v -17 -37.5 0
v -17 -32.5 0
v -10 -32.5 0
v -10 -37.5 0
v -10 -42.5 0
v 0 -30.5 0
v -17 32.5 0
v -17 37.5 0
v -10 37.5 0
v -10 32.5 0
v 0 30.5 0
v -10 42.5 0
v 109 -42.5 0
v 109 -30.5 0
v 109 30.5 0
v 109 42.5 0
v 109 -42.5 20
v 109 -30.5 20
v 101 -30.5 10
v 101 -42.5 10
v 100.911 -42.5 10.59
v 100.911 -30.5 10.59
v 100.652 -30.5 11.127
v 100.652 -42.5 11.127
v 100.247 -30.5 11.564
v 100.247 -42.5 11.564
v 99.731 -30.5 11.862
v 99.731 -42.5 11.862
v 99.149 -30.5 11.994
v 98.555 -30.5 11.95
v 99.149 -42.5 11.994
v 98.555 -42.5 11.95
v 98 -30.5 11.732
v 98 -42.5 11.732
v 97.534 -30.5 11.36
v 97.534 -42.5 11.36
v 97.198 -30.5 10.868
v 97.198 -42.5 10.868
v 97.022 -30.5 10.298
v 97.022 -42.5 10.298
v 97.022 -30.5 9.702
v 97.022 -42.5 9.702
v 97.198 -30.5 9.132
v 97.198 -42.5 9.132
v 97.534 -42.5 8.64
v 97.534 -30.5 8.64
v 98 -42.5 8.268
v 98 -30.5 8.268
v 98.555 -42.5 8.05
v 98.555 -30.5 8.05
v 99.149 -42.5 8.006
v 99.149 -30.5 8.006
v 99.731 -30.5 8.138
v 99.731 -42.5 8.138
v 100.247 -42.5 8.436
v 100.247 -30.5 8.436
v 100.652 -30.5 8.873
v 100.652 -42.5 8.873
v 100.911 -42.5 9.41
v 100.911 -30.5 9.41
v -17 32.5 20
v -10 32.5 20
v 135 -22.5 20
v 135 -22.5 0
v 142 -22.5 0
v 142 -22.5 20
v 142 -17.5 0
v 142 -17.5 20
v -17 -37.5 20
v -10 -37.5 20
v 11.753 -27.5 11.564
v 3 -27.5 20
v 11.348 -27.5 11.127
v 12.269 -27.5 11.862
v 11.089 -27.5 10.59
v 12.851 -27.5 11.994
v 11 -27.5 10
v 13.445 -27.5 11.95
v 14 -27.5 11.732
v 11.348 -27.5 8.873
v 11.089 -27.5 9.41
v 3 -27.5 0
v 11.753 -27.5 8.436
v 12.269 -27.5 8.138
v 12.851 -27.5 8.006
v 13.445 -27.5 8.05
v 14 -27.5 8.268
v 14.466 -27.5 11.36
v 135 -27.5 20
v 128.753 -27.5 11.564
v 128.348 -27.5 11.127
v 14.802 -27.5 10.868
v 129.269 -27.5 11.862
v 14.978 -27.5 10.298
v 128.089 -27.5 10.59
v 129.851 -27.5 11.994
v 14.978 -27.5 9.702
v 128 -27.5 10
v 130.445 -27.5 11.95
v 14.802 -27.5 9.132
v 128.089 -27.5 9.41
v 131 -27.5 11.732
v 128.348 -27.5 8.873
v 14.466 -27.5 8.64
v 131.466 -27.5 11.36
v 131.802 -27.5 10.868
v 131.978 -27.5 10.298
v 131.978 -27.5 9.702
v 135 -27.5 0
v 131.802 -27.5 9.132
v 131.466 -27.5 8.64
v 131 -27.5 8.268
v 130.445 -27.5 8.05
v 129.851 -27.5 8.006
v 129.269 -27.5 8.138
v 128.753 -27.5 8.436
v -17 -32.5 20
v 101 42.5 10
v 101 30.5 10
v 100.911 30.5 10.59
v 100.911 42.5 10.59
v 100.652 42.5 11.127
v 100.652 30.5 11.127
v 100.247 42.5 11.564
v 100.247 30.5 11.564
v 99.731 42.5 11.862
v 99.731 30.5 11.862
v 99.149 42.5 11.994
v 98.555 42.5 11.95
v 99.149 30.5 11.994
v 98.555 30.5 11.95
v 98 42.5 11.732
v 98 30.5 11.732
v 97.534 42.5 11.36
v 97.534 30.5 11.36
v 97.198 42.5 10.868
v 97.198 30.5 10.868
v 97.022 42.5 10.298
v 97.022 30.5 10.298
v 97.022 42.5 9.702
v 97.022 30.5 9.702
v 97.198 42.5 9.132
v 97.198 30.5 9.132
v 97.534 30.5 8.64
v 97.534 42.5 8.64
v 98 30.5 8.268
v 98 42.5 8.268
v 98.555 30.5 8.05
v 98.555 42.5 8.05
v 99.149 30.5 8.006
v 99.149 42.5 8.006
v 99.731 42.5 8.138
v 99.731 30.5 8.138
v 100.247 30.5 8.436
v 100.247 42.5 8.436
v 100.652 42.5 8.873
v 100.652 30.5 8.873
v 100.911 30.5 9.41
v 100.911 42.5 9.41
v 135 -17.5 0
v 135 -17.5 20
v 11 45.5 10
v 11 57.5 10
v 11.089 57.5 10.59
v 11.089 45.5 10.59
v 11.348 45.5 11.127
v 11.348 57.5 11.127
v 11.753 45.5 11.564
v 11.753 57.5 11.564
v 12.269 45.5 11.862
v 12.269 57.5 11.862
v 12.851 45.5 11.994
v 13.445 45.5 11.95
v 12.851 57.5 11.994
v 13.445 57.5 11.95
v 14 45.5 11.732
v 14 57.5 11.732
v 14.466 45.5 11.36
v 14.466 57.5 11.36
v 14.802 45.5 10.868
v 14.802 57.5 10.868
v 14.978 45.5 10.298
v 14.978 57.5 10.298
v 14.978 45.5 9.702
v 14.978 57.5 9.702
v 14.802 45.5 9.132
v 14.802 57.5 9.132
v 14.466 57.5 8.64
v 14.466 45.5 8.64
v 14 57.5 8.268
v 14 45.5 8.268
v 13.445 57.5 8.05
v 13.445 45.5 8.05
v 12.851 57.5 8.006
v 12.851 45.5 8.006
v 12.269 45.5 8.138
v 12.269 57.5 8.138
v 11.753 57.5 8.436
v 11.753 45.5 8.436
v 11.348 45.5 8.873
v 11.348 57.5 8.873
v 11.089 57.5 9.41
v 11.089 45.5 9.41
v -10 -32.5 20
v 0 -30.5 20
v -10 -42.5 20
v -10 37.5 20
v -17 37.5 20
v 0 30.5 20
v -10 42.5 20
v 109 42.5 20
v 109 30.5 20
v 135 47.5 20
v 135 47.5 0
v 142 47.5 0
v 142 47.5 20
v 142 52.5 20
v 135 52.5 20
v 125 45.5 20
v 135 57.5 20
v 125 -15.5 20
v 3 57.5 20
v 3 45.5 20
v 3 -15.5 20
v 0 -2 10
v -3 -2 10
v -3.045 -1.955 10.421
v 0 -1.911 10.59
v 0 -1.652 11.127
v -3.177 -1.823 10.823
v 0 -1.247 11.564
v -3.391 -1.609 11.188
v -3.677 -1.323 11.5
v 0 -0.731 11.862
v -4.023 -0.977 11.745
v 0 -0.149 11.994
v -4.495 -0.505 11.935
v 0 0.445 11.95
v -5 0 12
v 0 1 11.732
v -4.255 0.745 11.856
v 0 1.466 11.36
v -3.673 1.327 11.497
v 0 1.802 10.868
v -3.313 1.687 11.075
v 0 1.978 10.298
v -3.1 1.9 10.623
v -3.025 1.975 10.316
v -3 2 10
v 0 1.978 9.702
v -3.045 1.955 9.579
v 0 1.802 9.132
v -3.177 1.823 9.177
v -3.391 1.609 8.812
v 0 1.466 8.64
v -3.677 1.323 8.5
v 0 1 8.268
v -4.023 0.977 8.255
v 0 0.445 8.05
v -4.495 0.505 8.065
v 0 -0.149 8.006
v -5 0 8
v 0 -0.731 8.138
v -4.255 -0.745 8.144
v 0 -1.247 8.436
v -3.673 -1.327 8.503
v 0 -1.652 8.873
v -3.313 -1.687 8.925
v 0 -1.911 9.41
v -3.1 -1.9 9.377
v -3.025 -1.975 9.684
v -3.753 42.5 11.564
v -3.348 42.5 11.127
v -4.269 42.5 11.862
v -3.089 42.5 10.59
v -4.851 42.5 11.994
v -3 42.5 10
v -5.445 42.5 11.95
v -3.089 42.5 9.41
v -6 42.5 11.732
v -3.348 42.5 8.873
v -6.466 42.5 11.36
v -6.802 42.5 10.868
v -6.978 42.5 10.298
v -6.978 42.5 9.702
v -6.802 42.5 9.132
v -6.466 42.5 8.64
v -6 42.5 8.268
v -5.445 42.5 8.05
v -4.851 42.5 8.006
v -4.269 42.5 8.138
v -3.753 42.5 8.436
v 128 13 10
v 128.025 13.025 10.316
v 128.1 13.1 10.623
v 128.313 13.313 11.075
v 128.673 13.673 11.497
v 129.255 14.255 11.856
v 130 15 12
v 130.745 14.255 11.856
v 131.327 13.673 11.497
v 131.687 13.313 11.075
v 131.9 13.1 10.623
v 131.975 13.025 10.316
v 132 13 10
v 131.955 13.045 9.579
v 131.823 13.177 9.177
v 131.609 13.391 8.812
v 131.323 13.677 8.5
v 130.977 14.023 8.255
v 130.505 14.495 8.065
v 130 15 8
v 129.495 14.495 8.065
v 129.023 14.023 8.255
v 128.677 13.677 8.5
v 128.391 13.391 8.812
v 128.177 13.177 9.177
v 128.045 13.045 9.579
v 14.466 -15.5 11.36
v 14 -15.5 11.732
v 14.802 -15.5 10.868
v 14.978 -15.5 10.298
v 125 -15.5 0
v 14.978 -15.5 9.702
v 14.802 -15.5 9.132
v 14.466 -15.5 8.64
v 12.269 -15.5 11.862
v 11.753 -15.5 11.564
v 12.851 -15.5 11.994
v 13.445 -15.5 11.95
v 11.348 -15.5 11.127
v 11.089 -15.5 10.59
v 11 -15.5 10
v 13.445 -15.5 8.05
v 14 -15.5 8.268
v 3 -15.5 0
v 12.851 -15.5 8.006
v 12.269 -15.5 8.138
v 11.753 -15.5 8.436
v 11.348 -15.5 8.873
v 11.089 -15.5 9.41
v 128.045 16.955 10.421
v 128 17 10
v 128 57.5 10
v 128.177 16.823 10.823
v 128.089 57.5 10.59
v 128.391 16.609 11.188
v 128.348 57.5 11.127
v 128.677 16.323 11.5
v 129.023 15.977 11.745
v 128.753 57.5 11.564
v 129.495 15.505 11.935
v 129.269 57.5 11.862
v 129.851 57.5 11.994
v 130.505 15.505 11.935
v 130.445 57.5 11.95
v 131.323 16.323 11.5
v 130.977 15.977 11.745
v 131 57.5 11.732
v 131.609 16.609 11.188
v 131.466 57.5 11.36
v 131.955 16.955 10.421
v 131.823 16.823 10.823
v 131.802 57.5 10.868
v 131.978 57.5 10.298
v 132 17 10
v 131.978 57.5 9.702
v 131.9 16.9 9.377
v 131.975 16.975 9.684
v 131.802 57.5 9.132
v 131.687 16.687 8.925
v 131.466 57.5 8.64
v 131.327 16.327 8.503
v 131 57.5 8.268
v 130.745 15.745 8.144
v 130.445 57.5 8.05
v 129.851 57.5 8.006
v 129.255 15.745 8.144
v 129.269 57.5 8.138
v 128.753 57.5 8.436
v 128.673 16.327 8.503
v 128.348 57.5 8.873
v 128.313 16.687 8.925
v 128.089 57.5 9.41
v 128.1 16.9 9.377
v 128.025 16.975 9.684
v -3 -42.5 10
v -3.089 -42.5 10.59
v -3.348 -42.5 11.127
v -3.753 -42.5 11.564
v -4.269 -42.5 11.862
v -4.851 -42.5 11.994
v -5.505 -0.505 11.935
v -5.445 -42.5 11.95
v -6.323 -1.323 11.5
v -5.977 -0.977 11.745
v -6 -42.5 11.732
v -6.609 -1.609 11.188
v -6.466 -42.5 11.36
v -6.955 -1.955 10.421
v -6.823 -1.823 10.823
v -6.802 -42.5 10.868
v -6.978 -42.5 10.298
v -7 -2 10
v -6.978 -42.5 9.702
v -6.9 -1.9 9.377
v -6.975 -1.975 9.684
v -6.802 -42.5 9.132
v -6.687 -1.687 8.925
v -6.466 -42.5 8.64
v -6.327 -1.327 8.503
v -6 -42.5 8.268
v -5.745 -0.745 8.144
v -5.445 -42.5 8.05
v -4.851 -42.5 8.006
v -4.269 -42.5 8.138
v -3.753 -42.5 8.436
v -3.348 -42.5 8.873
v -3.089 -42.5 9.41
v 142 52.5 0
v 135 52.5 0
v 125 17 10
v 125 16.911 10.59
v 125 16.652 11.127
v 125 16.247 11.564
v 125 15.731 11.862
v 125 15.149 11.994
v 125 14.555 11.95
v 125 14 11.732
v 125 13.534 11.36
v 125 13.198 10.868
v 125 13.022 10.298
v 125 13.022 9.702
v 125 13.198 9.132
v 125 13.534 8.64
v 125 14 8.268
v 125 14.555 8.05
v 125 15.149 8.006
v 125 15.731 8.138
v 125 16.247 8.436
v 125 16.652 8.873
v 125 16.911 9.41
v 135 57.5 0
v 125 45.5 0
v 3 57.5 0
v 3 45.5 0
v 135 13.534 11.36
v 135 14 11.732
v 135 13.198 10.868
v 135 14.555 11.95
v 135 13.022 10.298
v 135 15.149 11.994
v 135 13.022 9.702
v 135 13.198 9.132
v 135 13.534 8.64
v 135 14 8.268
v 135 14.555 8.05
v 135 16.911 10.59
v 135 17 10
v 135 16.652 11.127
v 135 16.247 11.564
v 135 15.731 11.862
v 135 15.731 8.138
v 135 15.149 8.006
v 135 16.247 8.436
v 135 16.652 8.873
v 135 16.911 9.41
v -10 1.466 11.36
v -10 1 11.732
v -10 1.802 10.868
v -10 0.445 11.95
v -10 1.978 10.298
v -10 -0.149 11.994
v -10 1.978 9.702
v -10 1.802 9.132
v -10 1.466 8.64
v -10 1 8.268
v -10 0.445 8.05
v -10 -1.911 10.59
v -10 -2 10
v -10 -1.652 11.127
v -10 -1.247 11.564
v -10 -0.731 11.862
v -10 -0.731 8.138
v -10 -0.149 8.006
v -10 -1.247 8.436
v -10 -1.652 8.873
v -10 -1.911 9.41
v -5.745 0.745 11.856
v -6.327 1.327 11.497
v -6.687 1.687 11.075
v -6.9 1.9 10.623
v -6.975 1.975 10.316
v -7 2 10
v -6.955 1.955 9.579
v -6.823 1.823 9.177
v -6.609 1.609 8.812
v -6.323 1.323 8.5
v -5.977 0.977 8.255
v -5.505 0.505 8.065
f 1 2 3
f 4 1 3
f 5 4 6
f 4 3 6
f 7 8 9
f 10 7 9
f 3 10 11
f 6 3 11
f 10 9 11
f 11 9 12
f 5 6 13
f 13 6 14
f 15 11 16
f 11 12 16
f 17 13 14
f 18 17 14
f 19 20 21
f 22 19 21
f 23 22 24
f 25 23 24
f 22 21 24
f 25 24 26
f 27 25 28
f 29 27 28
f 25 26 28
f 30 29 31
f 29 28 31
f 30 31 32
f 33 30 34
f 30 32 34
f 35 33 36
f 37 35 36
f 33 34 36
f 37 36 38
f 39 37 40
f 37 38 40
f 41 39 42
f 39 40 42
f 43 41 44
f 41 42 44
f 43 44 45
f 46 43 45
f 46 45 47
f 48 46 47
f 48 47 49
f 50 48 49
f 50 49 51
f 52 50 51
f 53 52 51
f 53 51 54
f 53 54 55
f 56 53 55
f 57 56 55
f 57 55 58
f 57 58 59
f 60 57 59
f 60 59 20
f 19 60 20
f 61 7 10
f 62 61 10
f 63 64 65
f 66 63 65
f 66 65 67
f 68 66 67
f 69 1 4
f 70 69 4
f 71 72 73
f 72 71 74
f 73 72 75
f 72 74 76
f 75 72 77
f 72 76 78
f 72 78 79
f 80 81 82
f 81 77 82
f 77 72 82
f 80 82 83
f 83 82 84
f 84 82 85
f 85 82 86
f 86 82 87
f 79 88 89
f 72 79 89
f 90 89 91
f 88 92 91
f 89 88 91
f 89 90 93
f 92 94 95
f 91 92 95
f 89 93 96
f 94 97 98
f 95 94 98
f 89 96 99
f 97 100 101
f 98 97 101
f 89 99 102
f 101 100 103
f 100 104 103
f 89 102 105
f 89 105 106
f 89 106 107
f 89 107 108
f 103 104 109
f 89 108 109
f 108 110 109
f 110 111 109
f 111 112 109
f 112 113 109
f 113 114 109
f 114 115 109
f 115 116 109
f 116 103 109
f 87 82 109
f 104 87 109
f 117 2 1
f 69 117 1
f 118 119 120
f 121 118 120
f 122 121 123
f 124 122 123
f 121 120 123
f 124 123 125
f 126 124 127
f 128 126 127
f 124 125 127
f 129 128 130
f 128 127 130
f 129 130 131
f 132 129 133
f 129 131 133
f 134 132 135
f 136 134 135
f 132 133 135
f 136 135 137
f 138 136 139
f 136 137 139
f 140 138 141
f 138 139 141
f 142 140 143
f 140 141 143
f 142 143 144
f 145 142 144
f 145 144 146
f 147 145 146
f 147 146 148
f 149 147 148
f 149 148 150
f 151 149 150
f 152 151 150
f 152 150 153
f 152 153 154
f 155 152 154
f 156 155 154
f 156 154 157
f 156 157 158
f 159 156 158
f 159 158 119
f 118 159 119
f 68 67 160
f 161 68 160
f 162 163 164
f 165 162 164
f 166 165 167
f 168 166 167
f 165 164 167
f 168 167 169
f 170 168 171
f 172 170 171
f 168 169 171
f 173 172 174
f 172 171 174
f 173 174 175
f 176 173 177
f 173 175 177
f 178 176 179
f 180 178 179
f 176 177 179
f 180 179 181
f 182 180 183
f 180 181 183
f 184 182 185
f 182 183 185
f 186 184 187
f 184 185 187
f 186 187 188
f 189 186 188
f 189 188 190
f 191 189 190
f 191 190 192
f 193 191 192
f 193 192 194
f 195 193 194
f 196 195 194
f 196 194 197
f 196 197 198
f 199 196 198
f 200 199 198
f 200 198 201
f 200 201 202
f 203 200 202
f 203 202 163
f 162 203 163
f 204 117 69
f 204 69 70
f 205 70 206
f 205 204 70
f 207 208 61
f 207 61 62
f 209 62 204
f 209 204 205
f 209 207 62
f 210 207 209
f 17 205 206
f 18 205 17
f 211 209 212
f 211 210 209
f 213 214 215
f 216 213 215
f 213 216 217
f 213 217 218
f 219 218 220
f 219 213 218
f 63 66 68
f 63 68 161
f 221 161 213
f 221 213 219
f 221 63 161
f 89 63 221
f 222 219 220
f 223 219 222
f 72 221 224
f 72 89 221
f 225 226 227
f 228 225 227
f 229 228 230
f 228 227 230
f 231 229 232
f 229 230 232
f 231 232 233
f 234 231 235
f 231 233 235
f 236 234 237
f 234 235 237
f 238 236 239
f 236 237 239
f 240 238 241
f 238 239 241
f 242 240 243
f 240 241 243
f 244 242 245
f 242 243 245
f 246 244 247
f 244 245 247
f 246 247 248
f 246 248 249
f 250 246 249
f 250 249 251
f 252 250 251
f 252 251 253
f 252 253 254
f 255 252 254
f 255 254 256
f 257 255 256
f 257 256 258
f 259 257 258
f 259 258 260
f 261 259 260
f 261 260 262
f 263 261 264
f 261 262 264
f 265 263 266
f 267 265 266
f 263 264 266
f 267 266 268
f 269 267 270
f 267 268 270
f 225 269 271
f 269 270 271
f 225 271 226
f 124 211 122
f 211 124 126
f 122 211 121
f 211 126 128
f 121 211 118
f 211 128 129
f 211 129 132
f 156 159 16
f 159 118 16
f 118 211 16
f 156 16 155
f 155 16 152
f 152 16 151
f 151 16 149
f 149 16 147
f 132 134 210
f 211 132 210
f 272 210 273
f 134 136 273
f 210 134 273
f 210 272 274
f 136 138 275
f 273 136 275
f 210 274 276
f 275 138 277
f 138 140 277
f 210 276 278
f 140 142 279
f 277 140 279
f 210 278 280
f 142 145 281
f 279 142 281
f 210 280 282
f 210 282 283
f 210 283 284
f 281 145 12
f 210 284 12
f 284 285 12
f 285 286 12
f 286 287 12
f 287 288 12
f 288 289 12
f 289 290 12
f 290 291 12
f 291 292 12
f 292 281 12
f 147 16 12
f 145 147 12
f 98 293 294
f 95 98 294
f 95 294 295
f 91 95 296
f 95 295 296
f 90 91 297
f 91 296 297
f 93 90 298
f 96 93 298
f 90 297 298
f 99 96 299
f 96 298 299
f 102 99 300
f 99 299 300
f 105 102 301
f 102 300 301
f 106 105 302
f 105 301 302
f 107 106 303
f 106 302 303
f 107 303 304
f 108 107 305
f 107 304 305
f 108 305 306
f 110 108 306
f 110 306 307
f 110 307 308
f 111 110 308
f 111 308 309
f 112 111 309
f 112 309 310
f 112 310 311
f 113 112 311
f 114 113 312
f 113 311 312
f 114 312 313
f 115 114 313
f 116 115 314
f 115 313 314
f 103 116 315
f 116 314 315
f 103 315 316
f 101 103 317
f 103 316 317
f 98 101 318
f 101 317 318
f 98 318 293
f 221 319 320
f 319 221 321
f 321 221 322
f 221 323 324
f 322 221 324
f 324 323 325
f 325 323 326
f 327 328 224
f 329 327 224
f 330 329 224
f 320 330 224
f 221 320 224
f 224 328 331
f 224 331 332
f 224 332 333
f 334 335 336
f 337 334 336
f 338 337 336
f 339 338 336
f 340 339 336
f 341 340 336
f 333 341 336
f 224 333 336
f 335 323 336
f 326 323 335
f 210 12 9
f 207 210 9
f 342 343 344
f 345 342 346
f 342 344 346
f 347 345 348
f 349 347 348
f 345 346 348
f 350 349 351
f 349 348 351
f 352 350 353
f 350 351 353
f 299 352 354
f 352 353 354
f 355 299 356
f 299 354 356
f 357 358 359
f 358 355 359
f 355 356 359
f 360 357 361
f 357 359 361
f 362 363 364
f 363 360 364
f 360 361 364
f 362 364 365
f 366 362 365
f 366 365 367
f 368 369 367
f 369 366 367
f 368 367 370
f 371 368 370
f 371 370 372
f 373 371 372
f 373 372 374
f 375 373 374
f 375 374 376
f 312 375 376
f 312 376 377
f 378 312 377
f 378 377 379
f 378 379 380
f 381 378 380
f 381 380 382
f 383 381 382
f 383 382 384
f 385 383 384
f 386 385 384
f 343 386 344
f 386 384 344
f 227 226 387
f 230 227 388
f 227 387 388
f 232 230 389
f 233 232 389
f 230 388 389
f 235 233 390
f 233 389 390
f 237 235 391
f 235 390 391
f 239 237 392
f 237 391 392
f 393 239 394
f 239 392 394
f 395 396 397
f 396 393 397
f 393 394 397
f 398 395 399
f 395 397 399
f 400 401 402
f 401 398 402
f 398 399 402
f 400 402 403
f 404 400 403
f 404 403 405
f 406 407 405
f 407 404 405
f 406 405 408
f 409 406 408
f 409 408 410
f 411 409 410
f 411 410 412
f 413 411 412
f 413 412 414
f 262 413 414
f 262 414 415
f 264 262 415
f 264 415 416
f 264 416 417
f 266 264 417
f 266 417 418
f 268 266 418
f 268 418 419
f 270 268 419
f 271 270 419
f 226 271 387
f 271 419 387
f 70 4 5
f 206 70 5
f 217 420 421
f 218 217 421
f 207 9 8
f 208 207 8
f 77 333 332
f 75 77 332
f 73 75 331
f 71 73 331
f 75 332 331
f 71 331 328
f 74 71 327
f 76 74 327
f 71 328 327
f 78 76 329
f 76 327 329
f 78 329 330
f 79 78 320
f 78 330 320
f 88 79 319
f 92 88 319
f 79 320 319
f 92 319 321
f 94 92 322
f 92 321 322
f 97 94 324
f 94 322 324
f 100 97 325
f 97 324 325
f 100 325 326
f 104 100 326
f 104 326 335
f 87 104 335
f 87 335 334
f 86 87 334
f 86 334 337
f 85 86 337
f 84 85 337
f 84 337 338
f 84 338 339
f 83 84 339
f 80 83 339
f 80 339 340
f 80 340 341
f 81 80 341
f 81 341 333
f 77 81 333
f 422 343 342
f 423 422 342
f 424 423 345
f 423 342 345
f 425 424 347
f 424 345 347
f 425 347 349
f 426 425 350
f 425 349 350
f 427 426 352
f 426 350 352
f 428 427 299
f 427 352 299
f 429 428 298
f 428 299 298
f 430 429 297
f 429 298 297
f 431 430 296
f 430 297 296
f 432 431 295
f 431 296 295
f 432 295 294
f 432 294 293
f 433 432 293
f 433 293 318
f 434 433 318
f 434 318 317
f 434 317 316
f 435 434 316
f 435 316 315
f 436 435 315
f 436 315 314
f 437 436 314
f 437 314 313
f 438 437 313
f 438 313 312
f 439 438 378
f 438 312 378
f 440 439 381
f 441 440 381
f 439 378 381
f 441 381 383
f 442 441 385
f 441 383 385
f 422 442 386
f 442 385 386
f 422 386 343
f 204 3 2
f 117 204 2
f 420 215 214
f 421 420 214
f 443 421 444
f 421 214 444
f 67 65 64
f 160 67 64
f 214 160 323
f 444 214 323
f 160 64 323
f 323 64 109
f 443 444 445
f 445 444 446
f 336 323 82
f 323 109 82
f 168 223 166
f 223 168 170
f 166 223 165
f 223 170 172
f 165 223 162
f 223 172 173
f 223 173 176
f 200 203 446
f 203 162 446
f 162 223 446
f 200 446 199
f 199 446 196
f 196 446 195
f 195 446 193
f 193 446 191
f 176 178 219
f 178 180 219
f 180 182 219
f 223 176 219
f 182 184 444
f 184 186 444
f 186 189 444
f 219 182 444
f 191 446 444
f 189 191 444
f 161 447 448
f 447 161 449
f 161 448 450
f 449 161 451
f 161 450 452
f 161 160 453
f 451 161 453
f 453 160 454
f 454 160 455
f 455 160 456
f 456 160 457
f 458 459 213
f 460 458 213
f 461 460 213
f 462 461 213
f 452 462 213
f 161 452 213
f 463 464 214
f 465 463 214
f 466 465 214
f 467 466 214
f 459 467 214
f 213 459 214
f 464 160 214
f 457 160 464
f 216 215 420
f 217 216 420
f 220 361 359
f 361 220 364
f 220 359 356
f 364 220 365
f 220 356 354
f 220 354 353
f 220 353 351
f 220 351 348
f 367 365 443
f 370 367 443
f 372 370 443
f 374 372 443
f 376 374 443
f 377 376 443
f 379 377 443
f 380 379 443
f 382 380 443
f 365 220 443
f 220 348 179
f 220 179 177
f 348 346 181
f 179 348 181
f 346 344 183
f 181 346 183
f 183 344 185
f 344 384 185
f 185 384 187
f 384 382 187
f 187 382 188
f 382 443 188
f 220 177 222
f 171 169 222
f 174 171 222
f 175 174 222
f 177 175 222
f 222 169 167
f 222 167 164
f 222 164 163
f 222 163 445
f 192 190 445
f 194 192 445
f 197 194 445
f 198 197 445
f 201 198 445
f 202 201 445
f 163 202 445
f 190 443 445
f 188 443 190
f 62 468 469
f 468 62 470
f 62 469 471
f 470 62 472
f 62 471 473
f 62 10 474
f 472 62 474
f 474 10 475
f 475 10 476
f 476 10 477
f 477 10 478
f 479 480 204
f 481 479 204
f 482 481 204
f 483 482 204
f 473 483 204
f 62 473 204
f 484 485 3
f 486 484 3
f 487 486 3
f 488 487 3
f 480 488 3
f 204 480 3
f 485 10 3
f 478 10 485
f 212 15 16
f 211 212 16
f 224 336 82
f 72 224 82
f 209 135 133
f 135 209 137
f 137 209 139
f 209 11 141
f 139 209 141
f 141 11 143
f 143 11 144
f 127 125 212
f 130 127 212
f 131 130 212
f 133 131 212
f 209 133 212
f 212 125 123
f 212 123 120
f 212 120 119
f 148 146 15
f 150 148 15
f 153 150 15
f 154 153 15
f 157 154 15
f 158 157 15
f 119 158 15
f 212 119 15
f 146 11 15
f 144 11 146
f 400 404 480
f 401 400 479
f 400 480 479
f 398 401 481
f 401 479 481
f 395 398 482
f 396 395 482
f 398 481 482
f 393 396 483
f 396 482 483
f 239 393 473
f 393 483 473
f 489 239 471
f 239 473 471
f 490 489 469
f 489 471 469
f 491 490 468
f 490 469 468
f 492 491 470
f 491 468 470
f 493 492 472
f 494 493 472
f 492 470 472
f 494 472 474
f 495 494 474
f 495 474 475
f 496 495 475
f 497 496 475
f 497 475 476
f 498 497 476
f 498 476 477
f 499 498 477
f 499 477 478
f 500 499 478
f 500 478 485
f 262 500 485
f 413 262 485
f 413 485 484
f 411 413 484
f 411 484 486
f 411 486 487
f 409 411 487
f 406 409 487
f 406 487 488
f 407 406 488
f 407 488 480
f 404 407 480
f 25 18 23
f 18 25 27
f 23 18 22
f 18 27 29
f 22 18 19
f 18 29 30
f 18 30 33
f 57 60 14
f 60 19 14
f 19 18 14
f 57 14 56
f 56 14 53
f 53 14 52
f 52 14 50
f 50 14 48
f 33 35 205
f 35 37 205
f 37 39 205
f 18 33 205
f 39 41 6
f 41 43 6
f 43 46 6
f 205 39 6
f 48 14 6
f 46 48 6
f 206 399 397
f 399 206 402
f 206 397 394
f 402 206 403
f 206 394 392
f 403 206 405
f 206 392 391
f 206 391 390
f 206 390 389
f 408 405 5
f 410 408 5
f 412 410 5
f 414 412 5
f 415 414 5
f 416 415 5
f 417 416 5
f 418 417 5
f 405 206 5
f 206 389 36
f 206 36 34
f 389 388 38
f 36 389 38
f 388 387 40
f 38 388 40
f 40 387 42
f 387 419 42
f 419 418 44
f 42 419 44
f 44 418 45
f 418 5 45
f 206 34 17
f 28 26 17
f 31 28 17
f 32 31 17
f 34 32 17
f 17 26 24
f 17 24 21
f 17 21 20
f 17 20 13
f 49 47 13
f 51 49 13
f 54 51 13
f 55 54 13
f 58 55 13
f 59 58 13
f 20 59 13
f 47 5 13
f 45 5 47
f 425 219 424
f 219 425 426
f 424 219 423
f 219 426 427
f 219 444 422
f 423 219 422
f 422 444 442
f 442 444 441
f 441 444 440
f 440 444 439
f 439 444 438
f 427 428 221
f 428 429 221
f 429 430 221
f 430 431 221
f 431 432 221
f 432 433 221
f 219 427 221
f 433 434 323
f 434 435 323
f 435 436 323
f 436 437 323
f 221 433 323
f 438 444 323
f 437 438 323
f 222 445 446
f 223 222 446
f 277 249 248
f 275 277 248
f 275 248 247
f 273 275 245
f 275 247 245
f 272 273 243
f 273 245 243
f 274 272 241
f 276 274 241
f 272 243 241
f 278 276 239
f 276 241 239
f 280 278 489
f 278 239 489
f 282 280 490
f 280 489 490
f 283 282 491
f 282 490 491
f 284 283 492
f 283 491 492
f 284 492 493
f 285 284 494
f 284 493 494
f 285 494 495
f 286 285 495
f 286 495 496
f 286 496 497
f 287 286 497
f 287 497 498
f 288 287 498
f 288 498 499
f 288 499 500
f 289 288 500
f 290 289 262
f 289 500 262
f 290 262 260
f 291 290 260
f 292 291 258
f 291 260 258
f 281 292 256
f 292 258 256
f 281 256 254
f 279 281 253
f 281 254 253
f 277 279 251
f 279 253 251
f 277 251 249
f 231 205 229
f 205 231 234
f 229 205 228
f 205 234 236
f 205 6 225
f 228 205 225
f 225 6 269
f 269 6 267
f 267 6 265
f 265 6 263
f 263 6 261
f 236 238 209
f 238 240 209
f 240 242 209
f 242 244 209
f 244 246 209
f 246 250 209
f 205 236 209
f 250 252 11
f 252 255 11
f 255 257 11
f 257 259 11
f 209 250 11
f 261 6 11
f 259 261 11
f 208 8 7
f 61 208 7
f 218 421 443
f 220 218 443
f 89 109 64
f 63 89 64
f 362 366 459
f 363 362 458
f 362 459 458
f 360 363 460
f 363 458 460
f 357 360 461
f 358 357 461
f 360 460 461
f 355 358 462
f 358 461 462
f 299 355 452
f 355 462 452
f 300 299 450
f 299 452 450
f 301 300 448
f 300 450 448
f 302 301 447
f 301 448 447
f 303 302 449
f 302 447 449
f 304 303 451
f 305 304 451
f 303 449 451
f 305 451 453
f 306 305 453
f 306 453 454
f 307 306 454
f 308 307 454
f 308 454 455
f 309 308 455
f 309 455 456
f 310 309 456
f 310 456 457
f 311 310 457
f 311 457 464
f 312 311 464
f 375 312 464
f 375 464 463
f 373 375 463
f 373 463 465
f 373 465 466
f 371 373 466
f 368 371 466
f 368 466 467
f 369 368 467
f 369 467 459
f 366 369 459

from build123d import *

# Parameters (mm, degrees)
PAD_DEPTH       = 20
SKETCH004_R     = 2
POCKET002_DEPTH = 119.001
SKETCH005_R     = 2
POCKET003_DEPTH = 85.001
PAD001_DEPTH    = 20
SKETCH007_R     = 2
POCKET004_DEPTH = 132.001
SKETCH008_R     = 2
POCKET005_DEPTH = 85.001


with BuildPart() as soporte_agujero_superior_lateral:
    # Sketch → Pad (new body)
    with BuildSketch(Plane.XY):
        Polygon((-10, -42.5), (109, -42.5), (109, -30.5), (0, -30.5), (0, 30.5), (109, 30.5), (109, 42.5), (-10, 42.5), (-10, 37.5), (-17, 37.5), (-17, 32.5), (-10, 32.5), (-10, -32.5), (-17, -32.5), (-17, -37.5), (-10, -37.5), align=None)
    extrude(amount=PAD_DEPTH)

    # Sketch004 → Pocket002 (cut, through all)
    with BuildSketch(Plane(origin=(-10, 0, 0), x_dir=(0, -1, 0), z_dir=(-1, 0, 0))):
        with Locations((0, 10)):
            Circle(SKETCH004_R)
    extrude(amount=-POCKET002_DEPTH, mode=Mode.SUBTRACT)

    # Sketch005 → Pocket003 (cut, through all)
    with BuildSketch(Plane.XZ.offset(42.5)):
        with Locations((-5, 10)):
            Circle(SKETCH005_R)
        with Locations((99, 10)):
            Circle(SKETCH005_R)
    extrude(amount=-POCKET003_DEPTH, mode=Mode.SUBTRACT)


with BuildPart() as soporte_agujero_superior_lateral001:
    # Sketch006 → Pad001 (new body)
    with BuildSketch(Plane(origin=(125, 15, 0), x_dir=(-1, 0, 0), z_dir=(0, 0, 1))):
        Polygon((-10, -42.5), (122, -42.5), (122, -30.5), (0, -30.5), (0, 30.5), (122, 30.5), (122, 42.5), (-10, 42.5), (-10, 37.5), (-17, 37.5), (-17, 32.5), (-10, 32.5), (-10, -32.5), (-17, -32.5), (-17, -37.5), (-10, -37.5), align=None)
    extrude(amount=PAD001_DEPTH)

    # Sketch007 → Pocket004 (cut, through all)
    with BuildSketch(Plane(origin=(135, 15, 0), x_dir=(0, 1, 0), z_dir=(1, 0, 0))):
        with Locations((0, 10)):
            Circle(SKETCH007_R)
    extrude(amount=-POCKET004_DEPTH, mode=Mode.SUBTRACT)

    # Sketch008 → Pocket005 (cut, through all)
    with BuildSketch(Plane(origin=(125, 57.5, 0), x_dir=(-1, 0, 0), z_dir=(0, 1, 0))):
        with Locations((-5, 10)):
            Circle(SKETCH008_R)
        with Locations((112, 10)):
            Circle(SKETCH008_R)
    extrude(amount=-POCKET005_DEPTH, mode=Mode.SUBTRACT)


solid = Compound([soporte_agujero_superior_lateral.part, soporte_agujero_superior_lateral001.part])
